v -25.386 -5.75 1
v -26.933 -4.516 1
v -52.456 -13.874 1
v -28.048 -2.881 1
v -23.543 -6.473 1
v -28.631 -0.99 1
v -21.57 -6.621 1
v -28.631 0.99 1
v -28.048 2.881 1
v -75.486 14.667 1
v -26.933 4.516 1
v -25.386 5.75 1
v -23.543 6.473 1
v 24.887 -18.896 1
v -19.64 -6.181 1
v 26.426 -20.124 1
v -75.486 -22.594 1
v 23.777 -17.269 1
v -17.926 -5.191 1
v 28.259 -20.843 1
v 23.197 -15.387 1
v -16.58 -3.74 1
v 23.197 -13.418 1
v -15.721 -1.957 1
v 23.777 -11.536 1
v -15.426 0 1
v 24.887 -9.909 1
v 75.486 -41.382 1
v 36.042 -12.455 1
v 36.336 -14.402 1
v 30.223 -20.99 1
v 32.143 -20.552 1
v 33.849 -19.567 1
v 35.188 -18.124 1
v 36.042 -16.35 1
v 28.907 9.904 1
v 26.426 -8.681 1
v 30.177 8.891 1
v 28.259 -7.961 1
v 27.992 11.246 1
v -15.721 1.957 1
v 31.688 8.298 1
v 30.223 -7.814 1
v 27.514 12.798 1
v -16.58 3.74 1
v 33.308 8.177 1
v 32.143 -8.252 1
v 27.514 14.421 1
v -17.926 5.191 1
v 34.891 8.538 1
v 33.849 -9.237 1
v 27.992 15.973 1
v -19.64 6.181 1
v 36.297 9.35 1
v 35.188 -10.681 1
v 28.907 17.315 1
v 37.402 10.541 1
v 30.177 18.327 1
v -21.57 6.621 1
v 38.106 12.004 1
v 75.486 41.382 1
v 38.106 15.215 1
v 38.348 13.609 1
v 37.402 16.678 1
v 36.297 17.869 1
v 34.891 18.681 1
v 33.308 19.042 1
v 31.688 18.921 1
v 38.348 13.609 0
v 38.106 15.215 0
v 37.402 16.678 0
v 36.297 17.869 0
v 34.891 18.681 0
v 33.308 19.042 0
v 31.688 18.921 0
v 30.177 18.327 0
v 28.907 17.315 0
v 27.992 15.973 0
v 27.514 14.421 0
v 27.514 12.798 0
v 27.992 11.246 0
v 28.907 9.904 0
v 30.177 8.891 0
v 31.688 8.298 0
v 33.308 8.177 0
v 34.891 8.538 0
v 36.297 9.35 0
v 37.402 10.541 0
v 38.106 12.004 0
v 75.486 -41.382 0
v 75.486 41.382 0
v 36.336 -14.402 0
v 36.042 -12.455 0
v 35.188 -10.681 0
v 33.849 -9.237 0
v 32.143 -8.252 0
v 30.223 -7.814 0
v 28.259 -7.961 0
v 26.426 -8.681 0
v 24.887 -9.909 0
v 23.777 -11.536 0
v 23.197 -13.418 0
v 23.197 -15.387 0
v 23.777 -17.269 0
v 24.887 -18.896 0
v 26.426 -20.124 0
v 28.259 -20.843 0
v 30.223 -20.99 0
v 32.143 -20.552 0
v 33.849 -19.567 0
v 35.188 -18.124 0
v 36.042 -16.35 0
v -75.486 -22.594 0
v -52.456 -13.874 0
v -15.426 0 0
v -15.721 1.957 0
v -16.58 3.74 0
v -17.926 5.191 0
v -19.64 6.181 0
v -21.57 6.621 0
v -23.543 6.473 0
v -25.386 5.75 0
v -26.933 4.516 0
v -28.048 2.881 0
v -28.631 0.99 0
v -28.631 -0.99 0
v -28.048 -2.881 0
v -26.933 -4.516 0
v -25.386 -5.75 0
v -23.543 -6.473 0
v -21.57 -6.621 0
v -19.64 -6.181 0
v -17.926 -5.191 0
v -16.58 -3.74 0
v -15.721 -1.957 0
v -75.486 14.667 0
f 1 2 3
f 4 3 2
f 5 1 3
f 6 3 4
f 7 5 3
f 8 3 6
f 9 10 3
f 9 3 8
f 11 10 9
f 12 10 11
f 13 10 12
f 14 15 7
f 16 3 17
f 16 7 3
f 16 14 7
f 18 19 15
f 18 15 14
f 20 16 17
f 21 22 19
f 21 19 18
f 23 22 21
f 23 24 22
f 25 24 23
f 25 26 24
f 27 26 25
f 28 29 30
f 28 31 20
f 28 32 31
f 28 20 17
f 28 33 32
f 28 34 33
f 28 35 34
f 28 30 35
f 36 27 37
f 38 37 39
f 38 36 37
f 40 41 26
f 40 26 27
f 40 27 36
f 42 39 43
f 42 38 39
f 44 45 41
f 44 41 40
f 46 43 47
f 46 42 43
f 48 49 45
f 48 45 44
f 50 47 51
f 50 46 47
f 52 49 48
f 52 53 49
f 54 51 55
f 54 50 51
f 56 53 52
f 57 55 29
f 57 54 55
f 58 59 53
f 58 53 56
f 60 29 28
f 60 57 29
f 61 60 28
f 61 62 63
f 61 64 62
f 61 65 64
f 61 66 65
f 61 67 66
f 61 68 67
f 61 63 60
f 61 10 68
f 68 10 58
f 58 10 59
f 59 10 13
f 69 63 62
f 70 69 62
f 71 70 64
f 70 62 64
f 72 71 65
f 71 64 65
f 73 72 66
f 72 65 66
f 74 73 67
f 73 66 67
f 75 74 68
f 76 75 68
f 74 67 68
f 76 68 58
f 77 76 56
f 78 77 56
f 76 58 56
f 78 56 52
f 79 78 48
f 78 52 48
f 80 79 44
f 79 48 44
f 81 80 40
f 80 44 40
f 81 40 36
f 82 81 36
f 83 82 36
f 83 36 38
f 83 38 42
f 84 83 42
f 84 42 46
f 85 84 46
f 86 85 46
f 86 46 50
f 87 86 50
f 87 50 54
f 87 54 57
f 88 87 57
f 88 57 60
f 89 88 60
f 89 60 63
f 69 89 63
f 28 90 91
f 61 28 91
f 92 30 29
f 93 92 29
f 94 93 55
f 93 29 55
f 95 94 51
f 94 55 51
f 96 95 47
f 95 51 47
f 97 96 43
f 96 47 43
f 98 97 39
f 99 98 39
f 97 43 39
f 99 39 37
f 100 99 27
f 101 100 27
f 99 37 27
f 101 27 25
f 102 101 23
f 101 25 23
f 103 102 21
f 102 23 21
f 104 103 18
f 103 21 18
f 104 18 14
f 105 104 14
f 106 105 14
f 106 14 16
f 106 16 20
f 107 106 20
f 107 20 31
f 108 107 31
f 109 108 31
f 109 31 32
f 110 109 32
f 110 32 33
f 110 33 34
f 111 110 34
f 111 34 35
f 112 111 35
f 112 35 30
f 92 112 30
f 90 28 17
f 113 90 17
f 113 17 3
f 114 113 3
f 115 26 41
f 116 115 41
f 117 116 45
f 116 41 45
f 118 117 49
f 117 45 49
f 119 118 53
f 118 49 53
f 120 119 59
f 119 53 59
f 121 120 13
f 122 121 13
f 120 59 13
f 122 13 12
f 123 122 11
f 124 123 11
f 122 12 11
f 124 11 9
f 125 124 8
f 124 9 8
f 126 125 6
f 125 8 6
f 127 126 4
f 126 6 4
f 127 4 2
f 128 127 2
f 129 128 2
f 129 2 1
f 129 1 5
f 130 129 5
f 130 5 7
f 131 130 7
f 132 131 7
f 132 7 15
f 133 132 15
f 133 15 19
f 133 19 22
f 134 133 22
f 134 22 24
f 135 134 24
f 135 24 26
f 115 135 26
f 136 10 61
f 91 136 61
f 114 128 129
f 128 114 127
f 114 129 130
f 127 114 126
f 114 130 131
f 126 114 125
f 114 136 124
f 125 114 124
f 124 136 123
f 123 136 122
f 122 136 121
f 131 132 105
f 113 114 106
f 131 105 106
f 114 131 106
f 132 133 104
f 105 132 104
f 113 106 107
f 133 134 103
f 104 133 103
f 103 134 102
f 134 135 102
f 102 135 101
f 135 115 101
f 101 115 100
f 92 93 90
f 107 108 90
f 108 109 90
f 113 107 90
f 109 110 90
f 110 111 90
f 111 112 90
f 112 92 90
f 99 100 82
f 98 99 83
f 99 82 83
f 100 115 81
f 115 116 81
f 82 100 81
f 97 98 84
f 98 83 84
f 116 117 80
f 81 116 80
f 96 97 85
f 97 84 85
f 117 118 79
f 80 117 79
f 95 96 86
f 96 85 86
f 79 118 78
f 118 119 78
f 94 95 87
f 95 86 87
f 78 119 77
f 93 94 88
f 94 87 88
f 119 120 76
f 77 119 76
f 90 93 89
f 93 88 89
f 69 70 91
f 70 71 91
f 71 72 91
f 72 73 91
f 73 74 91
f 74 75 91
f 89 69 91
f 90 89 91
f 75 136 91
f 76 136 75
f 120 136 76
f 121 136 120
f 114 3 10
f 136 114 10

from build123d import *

# Parameters (mm, degrees)
F0_W     = 150.972114
F0_H     = 82.764328
F1_DEPTH = 1
F3_DEPTH = 25
F4_R     = 5.447895
F4_R_2   = 6.606543
F4_R_3   = 6.639495
F5_DEPTH = 25


with BuildPart() as f1:
    # F0 (on Top) → F1 (new body)
    with BuildSketch(Plane.XY):
        Rectangle(F0_W, F0_H)
    extrude(amount=F1_DEPTH)

    # F2 (on face) → F3 (cut)
    with BuildSketch(Plane.XY.offset(1)):
        Polygon((-75.486057, 14.666528), (75.486057, 41.382164), (-75.486057, 41.382164), align=None)
        Polygon((-52.455958, -13.873742), (-75.486057, 14.666528), (-75.486057, -22.594379), align=None)
        Polygon((-75.486057, -41.382164), (75.486057, -41.382164), (-75.486057, -22.594379), align=None)
    extrude(amount=-F3_DEPTH, mode=Mode.SUBTRACT)

    # F4 (on face) → F5 (cut)
    with BuildSketch(Plane.XY.offset(1)):
        with Locations((32.90059, 13.609481)):
            Circle(F4_R)
        with Locations((29.729448, -14.402266)):
            Circle(F4_R_2)
        with Locations((-22.065856, 0)):
            Circle(F4_R_3)
    extrude(amount=-F5_DEPTH, mode=Mode.SUBTRACT)


solid = f1.part
